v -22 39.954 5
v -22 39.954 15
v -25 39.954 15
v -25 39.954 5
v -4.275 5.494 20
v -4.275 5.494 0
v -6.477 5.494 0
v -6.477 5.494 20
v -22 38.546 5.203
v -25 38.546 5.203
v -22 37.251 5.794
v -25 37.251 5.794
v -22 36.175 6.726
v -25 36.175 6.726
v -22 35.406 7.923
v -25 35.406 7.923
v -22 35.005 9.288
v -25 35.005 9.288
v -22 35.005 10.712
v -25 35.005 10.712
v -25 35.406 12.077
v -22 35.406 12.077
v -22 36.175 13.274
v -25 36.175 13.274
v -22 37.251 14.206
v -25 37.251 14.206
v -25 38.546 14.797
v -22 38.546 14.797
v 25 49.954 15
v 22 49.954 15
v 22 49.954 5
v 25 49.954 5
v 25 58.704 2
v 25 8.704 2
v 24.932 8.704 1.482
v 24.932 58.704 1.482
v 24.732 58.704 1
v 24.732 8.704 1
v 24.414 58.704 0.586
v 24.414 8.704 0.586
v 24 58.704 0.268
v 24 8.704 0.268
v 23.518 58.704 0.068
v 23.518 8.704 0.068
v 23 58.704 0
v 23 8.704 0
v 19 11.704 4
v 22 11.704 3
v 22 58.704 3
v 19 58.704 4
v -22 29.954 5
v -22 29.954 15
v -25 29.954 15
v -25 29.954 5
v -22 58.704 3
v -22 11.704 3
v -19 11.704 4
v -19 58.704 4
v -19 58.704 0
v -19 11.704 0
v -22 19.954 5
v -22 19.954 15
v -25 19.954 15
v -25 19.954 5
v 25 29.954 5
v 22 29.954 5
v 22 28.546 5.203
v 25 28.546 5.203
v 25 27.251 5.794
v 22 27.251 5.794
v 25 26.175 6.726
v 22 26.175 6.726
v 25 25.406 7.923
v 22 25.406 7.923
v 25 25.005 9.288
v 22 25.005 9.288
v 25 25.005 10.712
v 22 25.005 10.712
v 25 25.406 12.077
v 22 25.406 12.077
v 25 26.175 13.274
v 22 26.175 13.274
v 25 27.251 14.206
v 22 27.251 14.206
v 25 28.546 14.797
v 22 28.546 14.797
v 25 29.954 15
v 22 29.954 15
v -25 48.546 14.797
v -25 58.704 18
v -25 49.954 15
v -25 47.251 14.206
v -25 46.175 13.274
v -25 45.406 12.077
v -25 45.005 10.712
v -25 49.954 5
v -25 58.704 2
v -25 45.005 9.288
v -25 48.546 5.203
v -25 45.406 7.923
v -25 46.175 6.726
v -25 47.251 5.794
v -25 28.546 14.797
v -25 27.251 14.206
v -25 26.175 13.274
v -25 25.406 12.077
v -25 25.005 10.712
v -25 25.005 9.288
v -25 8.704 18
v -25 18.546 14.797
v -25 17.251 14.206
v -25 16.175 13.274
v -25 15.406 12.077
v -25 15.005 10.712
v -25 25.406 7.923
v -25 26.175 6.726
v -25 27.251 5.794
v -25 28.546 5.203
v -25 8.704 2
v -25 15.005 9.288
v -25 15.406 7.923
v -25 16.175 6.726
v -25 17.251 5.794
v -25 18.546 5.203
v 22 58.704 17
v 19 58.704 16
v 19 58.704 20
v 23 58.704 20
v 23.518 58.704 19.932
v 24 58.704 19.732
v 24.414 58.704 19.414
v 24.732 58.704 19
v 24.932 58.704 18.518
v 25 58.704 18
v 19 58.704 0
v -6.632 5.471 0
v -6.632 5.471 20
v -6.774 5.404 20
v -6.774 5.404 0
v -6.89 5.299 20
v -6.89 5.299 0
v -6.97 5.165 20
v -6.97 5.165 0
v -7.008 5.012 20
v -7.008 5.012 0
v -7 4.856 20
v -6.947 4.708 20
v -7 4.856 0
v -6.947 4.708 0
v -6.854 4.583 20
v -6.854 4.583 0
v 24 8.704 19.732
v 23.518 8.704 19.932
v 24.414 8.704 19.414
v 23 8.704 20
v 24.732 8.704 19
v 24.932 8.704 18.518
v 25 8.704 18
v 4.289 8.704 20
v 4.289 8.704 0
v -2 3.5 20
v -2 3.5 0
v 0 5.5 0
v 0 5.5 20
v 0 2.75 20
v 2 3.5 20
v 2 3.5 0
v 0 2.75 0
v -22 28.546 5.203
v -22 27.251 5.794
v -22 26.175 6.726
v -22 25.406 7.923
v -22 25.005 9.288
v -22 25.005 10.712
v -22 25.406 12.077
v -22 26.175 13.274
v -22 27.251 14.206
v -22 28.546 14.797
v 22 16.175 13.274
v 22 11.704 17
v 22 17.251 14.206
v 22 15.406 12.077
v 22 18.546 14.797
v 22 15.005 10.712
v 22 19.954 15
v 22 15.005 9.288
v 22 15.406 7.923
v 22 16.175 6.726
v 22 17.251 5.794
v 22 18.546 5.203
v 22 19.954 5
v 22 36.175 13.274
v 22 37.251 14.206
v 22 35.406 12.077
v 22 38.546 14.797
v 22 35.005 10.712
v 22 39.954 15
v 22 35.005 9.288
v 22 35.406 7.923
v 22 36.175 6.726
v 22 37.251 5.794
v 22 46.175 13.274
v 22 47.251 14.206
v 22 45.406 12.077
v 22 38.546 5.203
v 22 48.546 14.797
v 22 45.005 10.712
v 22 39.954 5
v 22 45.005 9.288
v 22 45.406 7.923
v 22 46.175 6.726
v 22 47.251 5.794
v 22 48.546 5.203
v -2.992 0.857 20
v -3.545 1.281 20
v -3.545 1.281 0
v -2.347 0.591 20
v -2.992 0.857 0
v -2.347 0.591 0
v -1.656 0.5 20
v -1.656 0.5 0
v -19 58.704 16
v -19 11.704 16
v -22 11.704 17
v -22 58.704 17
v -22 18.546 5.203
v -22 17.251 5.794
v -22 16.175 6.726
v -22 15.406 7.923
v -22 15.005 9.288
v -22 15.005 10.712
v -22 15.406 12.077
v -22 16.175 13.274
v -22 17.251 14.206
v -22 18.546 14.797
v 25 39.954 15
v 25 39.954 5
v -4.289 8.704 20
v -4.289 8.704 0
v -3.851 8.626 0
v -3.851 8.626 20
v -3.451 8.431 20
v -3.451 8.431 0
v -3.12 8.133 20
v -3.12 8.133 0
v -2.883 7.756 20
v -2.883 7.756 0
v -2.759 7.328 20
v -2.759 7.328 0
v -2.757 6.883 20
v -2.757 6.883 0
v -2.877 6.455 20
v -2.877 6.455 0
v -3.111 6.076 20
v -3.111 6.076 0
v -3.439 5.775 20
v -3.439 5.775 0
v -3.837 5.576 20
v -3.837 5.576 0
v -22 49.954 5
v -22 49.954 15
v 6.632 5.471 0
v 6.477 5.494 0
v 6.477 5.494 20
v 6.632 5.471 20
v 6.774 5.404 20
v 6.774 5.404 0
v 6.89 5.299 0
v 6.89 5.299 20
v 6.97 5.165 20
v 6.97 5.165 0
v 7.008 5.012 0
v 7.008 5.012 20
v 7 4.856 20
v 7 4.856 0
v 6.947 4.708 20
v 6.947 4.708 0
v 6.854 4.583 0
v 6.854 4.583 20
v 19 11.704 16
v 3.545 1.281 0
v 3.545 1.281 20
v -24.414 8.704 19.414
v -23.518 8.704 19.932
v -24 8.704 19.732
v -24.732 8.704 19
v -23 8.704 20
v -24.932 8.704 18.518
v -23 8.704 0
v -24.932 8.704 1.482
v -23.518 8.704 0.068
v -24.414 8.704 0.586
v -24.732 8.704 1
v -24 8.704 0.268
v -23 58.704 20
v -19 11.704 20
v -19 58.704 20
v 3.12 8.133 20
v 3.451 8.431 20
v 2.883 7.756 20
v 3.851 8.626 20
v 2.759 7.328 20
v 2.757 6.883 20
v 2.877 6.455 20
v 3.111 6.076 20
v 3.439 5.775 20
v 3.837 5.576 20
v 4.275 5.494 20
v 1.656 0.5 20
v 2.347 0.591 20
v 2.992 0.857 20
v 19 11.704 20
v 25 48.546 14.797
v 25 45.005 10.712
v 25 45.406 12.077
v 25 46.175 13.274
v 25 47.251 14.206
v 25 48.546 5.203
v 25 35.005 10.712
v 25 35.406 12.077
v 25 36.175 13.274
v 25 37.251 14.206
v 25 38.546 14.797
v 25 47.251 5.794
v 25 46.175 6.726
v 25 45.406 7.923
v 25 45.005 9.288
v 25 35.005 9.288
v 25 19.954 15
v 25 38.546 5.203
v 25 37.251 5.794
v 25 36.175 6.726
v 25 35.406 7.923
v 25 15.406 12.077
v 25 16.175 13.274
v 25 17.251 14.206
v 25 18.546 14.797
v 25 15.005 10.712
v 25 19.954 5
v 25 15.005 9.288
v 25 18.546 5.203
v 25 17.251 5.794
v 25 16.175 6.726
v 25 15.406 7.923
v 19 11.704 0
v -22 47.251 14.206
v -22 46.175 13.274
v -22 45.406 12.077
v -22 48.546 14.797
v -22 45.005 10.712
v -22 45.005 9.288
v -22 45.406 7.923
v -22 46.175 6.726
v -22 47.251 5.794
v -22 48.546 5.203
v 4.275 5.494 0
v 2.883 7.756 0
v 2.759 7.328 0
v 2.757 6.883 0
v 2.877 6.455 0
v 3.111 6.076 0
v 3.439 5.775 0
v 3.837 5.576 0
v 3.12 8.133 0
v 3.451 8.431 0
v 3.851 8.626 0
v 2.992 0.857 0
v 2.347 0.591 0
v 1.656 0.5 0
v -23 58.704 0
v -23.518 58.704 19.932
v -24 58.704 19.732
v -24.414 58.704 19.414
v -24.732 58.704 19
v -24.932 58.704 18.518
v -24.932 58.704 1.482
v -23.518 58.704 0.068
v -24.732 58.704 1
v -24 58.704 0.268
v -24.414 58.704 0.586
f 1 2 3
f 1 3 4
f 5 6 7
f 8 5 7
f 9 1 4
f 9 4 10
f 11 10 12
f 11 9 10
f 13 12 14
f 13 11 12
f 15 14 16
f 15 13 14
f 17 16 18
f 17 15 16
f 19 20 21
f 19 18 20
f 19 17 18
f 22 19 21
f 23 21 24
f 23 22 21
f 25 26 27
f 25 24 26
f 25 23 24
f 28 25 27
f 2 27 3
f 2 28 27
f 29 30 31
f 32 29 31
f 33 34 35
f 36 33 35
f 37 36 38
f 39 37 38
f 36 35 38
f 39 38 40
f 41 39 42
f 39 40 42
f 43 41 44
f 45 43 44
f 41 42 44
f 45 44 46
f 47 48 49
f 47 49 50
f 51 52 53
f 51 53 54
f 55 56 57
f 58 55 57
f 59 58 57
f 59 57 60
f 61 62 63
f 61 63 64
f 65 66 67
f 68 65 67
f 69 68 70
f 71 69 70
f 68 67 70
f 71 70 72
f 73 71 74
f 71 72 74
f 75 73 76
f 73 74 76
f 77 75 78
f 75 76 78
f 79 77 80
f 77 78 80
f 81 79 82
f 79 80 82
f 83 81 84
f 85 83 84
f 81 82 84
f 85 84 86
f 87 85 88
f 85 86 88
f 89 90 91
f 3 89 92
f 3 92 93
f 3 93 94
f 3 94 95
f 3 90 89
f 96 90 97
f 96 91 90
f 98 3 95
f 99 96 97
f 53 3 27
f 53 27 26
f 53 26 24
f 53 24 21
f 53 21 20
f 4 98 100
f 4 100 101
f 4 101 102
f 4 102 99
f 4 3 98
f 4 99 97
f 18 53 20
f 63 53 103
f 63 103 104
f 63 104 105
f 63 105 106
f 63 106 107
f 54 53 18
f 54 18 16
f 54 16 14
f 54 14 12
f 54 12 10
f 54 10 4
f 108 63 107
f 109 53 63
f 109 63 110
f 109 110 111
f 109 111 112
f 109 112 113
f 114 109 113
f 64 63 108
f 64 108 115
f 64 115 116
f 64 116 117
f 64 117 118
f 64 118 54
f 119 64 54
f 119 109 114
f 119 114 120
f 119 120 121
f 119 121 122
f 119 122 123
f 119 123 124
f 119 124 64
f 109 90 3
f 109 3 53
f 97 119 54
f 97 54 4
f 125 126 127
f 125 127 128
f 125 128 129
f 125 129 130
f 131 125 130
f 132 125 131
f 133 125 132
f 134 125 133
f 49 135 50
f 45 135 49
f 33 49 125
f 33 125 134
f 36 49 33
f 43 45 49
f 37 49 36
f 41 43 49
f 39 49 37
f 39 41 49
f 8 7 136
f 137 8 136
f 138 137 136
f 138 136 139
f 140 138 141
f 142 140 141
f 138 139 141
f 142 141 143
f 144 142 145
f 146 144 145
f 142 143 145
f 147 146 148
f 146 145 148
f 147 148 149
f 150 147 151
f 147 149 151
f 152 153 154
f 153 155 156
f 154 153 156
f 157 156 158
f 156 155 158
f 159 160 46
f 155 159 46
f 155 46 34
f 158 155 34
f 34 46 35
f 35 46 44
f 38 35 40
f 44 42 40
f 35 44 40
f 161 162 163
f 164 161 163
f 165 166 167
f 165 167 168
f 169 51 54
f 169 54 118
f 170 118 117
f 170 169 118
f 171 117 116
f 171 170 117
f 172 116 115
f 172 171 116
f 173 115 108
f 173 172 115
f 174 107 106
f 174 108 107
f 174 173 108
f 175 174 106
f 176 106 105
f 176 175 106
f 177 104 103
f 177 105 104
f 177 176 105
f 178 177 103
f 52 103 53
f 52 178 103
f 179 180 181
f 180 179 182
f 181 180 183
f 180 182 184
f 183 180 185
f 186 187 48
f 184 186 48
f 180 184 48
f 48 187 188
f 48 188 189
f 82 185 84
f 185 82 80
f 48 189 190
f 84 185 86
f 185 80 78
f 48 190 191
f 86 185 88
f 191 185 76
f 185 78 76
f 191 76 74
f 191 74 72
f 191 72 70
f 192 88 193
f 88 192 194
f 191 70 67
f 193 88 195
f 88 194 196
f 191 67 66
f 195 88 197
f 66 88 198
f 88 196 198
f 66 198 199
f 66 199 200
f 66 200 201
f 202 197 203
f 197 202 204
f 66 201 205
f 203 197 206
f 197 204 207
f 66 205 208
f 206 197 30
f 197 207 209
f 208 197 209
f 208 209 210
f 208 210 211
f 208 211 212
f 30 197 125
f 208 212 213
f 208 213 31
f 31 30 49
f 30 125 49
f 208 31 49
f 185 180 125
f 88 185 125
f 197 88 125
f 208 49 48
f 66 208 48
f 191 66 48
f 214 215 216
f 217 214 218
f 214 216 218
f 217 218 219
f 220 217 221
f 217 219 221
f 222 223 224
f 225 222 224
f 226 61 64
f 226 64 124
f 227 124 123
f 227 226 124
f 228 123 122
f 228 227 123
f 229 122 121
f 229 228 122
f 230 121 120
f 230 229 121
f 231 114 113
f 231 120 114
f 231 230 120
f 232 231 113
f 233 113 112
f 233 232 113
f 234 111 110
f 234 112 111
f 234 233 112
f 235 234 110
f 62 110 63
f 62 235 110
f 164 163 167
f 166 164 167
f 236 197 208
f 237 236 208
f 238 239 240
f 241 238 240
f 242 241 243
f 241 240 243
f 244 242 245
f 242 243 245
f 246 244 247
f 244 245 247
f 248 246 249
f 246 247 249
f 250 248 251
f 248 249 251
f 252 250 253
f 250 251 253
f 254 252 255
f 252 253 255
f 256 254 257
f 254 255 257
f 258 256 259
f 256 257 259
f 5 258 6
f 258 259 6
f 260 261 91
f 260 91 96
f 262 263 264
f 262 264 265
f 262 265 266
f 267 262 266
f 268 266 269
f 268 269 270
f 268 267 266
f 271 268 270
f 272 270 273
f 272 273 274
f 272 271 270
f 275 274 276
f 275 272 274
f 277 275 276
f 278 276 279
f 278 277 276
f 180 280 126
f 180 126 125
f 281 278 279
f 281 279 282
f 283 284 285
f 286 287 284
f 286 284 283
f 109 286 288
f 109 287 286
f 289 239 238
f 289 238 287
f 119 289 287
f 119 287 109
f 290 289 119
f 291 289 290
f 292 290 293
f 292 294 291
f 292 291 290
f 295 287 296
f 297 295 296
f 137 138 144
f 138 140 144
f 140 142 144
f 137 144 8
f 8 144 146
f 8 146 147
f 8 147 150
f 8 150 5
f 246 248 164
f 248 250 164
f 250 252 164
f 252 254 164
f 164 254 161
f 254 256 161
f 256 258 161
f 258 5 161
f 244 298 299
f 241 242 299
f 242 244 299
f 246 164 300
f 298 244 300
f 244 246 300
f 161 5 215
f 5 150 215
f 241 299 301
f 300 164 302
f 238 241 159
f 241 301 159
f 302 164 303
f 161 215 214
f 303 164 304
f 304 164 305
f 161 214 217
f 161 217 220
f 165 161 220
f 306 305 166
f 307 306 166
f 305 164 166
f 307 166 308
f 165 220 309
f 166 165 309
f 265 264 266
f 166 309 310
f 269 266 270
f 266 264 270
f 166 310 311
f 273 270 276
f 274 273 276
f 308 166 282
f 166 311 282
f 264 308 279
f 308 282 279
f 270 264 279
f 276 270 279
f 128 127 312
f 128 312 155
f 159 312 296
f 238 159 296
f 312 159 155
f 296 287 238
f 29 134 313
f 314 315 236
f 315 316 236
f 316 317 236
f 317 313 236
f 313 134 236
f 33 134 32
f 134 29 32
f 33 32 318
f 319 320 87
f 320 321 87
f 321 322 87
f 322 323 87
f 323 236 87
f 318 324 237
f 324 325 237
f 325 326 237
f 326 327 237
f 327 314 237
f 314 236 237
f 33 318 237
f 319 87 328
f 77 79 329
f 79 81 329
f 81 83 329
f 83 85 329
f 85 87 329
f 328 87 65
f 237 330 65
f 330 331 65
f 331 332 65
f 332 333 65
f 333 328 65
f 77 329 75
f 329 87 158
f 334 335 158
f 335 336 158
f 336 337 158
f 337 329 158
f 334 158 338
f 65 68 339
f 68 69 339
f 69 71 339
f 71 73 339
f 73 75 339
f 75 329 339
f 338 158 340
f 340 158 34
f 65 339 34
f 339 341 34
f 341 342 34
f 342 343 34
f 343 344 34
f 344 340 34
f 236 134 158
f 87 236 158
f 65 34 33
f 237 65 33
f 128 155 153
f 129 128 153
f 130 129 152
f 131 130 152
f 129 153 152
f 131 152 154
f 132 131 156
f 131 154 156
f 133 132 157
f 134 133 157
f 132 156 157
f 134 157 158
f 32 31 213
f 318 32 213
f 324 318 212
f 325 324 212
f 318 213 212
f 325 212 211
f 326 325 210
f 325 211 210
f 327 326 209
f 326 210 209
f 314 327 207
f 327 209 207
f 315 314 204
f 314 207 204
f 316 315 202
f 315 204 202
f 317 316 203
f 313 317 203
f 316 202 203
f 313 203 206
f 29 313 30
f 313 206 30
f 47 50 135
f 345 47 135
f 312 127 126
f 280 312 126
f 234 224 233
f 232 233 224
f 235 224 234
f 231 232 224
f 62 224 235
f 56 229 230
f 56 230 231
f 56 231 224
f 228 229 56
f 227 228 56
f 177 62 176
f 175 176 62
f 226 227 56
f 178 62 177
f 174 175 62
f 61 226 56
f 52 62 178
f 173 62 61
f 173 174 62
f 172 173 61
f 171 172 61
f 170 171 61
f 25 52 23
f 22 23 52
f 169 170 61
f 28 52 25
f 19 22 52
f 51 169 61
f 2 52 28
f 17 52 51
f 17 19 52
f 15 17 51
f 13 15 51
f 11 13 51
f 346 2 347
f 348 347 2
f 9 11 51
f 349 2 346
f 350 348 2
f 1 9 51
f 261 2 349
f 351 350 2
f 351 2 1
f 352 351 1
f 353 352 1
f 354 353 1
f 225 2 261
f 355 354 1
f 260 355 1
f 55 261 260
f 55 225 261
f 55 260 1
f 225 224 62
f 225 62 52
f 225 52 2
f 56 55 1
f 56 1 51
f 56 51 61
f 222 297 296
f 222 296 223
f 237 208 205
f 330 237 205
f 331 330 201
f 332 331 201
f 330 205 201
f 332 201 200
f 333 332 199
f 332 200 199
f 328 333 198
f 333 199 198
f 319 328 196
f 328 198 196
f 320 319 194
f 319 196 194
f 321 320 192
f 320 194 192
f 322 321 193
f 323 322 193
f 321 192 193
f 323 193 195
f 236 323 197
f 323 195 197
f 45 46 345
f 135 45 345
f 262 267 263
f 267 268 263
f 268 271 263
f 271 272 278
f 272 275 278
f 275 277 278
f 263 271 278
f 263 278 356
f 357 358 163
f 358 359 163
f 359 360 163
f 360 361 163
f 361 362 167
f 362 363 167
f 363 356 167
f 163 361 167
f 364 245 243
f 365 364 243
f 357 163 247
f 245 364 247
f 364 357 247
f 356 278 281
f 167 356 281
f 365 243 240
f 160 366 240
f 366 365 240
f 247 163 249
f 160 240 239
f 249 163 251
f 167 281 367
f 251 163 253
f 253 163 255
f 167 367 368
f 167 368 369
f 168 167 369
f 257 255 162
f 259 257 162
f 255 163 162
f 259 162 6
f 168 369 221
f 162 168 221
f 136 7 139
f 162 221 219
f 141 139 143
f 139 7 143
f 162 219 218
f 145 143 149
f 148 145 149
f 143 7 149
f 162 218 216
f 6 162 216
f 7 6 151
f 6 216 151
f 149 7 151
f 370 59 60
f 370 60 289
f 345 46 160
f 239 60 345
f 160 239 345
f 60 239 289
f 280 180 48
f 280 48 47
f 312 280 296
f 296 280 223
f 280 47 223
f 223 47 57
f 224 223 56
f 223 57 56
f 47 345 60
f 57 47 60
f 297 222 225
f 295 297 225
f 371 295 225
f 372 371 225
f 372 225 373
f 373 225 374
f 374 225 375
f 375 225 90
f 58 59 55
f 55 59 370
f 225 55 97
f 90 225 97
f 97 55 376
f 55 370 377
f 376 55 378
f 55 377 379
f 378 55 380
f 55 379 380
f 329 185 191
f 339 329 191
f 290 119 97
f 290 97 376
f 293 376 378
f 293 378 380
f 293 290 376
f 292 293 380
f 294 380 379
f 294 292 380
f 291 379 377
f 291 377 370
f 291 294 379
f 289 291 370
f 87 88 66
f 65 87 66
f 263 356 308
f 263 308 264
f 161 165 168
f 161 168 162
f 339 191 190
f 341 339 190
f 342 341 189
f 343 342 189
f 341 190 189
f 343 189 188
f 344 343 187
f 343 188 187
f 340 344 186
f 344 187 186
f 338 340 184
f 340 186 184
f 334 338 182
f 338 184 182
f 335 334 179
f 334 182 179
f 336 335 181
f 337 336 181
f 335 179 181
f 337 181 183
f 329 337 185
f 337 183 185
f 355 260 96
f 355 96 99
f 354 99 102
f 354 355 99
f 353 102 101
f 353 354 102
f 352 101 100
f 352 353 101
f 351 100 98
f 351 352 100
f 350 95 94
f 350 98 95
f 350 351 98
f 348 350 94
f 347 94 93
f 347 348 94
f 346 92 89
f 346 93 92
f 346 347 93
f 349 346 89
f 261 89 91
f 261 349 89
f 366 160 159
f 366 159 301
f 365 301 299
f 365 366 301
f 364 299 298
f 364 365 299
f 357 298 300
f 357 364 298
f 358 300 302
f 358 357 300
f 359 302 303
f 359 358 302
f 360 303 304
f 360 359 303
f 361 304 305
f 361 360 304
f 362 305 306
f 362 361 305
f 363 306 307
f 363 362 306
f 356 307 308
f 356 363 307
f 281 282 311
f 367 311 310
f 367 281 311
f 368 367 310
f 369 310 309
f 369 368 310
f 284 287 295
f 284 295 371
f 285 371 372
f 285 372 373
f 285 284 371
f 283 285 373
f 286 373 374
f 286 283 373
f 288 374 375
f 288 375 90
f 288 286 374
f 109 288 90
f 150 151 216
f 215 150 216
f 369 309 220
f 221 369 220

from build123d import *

# Parameters (mm, degrees)
BOSS_EXTRUDE1_DEPTH  = 20
BOSS_EXTRUDE2_DEPTH  = 50
CUT_EXTRUDE1_DEPTH   = 47
CUT_EXTRUDE2_DEPTH   = 4
LPATTERN1_COUNT      = 4
LPATTERN1_PITCH      = 10
MIRROR2_COPY_1_DEPTH = 4
MIRROR2_COPY_2_DEPTH = 4
MIRROR2_COPY_3_DEPTH = 4
CUT_EXTRUDE3_DEPTH   = 30


with BuildPart() as part:
    # Sketch1 → Boss-Extrude1 (new body)
    with BuildSketch(Plane.XY):
        with BuildLine():
            ThreePointArc((-4.288832517, 8.7042), (-2.742571539, 7.105968455), (-4.274927306, 5.4944))
            Line((-4.274927306, 5.4944), (-6.476788598, 5.4944))
            ThreePointArc((-6.476788598, 5.4944), (-6.970173245, 5.164526769), (-6.853887321, 4.582528193))
            Line((-6.853887321, 4.582528193), (-3.545123878, 1.281326675))
            ThreePointArc((-3.545123878, 1.281326675), (-2.678042762, 0.703037101), (-1.655778399, 0.5))
            Line((-1.655778399, 0.5), (0, 0.5))
            Line((0, 0.5), (0, 8.7042))
            Line((0, 8.7042), (-4.288832517, 8.7042))
        make_face()
    boss_extrude1 = extrude(amount=BOSS_EXTRUDE1_DEPTH)

    # Sketch2 → Boss-Extrude2 (add)
    with BuildSketch(Plane(origin=(0, 8.7042, 0), x_dir=(1, 0, 0), z_dir=(0, 1, 0))):
        with BuildLine():
            Line((0, -20), (-23, -20))
            ThreePointArc((-23, -20), (-24.414213562, -19.414213562), (-25, -18))
            Line((-25, -18), (-25, -2))
            ThreePointArc((-25, -2), (-24.414213562, -0.585786438), (-23, 0))
            Line((-23, 0), (0, 0))
            Line((0, 0), (0, -20))
        make_face()
    boss_extrude2 = extrude(amount=BOSS_EXTRUDE2_DEPTH)

    # Sketch4 → Cut-Extrude1 (cut)
    with BuildSketch(Plane(origin=(0, 58.7042, 0), x_dir=(1, 0, 0), z_dir=(0, 1, 0))):
        Polygon((-22, -17), (-22, -3), (-19, -4), (-19, 0), (0, 0), (0, -20), (-19, -20), (-19, -16), align=None)
    cut_extrude1 = extrude(amount=-CUT_EXTRUDE1_DEPTH, mode=Mode.SUBTRACT)

    # Sketch6 → Cut-Extrude2 (cut, through all)
    with BuildSketch(Plane(origin=(-22, 0, 0), x_dir=(0, 0, -1), z_dir=(1, 0, 0))):
        with BuildLine():
            Line((-15, 19.9542), (-5, 19.9542))
            ThreePointArc((-5, 19.9542), (-10, 14.9542), (-15, 19.9542))
        make_face()
    cut_extrude2 = extrude(amount=-CUT_EXTRUDE2_DEPTH, mode=Mode.SUBTRACT)

    # LPattern1: Cut-Extrude2 ×4
    with Locations(*[(0, i * LPATTERN1_PITCH, 0) for i in range(1, LPATTERN1_COUNT)]):
        add(cut_extrude2, mode=Mode.SUBTRACT)

    # Mirror2: Boss-Extrude1, Boss-Extrude2, Cut-Extrude1, Cut-Extrude2 across Right Plane
    add(boss_extrude1.mirror(Plane(origin=(0, 0, 0), x_dir=(0, 0, -1), z_dir=(1, 0, 0))))
    add(boss_extrude2.mirror(Plane(origin=(0, 0, 0), x_dir=(0, 0, -1), z_dir=(1, 0, 0))))
    add(cut_extrude1.mirror(Plane(origin=(0, 0, 0), x_dir=(0, 0, -1), z_dir=(1, 0, 0))), mode=Mode.SUBTRACT)
    add(cut_extrude2.mirror(Plane(origin=(0, 0, 0), x_dir=(0, 0, -1), z_dir=(1, 0, 0))), mode=Mode.SUBTRACT)

    # Mirror2 copy 1 sketch → Mirror2 copy 1 (cut, through all)
    with BuildSketch(Plane(origin=(22, 10, 0), x_dir=(0, 0, -1), z_dir=(-1, 0, 0))):
        with BuildLine():
            Line((-15, -19.9542), (-5, -19.9542))
            ThreePointArc((-5, -19.9542), (-10, -14.9542), (-15, -19.9542))
        make_face()
    extrude(amount=-MIRROR2_COPY_1_DEPTH, mode=Mode.SUBTRACT)

    # Mirror2 copy 2 sketch → Mirror2 copy 2 (cut, through all)
    with BuildSketch(Plane(origin=(22, 20, 0), x_dir=(0, 0, -1), z_dir=(-1, 0, 0))):
        with BuildLine():
            Line((-15, -19.9542), (-5, -19.9542))
            ThreePointArc((-5, -19.9542), (-10, -14.9542), (-15, -19.9542))
        make_face()
    extrude(amount=-MIRROR2_COPY_2_DEPTH, mode=Mode.SUBTRACT)

    # Mirror2 copy 3 sketch → Mirror2 copy 3 (cut, through all)
    with BuildSketch(Plane(origin=(22, 30, 0), x_dir=(0, 0, -1), z_dir=(-1, 0, 0))):
        with BuildLine():
            Line((-15, -19.9542), (-5, -19.9542))
            ThreePointArc((-5, -19.9542), (-10, -14.9542), (-15, -19.9542))
        make_face()
    extrude(amount=-MIRROR2_COPY_3_DEPTH, mode=Mode.SUBTRACT)

    # Sketch7 → Cut-Extrude3 (cut)
    with BuildSketch(Plane.XY.offset(20)):
        Polygon((-2, 3.5), (0, 5.5), (2, 3.5), (0, 2.75), align=None)
    extrude(amount=-CUT_EXTRUDE3_DEPTH, mode=Mode.SUBTRACT)


solid = part.part
